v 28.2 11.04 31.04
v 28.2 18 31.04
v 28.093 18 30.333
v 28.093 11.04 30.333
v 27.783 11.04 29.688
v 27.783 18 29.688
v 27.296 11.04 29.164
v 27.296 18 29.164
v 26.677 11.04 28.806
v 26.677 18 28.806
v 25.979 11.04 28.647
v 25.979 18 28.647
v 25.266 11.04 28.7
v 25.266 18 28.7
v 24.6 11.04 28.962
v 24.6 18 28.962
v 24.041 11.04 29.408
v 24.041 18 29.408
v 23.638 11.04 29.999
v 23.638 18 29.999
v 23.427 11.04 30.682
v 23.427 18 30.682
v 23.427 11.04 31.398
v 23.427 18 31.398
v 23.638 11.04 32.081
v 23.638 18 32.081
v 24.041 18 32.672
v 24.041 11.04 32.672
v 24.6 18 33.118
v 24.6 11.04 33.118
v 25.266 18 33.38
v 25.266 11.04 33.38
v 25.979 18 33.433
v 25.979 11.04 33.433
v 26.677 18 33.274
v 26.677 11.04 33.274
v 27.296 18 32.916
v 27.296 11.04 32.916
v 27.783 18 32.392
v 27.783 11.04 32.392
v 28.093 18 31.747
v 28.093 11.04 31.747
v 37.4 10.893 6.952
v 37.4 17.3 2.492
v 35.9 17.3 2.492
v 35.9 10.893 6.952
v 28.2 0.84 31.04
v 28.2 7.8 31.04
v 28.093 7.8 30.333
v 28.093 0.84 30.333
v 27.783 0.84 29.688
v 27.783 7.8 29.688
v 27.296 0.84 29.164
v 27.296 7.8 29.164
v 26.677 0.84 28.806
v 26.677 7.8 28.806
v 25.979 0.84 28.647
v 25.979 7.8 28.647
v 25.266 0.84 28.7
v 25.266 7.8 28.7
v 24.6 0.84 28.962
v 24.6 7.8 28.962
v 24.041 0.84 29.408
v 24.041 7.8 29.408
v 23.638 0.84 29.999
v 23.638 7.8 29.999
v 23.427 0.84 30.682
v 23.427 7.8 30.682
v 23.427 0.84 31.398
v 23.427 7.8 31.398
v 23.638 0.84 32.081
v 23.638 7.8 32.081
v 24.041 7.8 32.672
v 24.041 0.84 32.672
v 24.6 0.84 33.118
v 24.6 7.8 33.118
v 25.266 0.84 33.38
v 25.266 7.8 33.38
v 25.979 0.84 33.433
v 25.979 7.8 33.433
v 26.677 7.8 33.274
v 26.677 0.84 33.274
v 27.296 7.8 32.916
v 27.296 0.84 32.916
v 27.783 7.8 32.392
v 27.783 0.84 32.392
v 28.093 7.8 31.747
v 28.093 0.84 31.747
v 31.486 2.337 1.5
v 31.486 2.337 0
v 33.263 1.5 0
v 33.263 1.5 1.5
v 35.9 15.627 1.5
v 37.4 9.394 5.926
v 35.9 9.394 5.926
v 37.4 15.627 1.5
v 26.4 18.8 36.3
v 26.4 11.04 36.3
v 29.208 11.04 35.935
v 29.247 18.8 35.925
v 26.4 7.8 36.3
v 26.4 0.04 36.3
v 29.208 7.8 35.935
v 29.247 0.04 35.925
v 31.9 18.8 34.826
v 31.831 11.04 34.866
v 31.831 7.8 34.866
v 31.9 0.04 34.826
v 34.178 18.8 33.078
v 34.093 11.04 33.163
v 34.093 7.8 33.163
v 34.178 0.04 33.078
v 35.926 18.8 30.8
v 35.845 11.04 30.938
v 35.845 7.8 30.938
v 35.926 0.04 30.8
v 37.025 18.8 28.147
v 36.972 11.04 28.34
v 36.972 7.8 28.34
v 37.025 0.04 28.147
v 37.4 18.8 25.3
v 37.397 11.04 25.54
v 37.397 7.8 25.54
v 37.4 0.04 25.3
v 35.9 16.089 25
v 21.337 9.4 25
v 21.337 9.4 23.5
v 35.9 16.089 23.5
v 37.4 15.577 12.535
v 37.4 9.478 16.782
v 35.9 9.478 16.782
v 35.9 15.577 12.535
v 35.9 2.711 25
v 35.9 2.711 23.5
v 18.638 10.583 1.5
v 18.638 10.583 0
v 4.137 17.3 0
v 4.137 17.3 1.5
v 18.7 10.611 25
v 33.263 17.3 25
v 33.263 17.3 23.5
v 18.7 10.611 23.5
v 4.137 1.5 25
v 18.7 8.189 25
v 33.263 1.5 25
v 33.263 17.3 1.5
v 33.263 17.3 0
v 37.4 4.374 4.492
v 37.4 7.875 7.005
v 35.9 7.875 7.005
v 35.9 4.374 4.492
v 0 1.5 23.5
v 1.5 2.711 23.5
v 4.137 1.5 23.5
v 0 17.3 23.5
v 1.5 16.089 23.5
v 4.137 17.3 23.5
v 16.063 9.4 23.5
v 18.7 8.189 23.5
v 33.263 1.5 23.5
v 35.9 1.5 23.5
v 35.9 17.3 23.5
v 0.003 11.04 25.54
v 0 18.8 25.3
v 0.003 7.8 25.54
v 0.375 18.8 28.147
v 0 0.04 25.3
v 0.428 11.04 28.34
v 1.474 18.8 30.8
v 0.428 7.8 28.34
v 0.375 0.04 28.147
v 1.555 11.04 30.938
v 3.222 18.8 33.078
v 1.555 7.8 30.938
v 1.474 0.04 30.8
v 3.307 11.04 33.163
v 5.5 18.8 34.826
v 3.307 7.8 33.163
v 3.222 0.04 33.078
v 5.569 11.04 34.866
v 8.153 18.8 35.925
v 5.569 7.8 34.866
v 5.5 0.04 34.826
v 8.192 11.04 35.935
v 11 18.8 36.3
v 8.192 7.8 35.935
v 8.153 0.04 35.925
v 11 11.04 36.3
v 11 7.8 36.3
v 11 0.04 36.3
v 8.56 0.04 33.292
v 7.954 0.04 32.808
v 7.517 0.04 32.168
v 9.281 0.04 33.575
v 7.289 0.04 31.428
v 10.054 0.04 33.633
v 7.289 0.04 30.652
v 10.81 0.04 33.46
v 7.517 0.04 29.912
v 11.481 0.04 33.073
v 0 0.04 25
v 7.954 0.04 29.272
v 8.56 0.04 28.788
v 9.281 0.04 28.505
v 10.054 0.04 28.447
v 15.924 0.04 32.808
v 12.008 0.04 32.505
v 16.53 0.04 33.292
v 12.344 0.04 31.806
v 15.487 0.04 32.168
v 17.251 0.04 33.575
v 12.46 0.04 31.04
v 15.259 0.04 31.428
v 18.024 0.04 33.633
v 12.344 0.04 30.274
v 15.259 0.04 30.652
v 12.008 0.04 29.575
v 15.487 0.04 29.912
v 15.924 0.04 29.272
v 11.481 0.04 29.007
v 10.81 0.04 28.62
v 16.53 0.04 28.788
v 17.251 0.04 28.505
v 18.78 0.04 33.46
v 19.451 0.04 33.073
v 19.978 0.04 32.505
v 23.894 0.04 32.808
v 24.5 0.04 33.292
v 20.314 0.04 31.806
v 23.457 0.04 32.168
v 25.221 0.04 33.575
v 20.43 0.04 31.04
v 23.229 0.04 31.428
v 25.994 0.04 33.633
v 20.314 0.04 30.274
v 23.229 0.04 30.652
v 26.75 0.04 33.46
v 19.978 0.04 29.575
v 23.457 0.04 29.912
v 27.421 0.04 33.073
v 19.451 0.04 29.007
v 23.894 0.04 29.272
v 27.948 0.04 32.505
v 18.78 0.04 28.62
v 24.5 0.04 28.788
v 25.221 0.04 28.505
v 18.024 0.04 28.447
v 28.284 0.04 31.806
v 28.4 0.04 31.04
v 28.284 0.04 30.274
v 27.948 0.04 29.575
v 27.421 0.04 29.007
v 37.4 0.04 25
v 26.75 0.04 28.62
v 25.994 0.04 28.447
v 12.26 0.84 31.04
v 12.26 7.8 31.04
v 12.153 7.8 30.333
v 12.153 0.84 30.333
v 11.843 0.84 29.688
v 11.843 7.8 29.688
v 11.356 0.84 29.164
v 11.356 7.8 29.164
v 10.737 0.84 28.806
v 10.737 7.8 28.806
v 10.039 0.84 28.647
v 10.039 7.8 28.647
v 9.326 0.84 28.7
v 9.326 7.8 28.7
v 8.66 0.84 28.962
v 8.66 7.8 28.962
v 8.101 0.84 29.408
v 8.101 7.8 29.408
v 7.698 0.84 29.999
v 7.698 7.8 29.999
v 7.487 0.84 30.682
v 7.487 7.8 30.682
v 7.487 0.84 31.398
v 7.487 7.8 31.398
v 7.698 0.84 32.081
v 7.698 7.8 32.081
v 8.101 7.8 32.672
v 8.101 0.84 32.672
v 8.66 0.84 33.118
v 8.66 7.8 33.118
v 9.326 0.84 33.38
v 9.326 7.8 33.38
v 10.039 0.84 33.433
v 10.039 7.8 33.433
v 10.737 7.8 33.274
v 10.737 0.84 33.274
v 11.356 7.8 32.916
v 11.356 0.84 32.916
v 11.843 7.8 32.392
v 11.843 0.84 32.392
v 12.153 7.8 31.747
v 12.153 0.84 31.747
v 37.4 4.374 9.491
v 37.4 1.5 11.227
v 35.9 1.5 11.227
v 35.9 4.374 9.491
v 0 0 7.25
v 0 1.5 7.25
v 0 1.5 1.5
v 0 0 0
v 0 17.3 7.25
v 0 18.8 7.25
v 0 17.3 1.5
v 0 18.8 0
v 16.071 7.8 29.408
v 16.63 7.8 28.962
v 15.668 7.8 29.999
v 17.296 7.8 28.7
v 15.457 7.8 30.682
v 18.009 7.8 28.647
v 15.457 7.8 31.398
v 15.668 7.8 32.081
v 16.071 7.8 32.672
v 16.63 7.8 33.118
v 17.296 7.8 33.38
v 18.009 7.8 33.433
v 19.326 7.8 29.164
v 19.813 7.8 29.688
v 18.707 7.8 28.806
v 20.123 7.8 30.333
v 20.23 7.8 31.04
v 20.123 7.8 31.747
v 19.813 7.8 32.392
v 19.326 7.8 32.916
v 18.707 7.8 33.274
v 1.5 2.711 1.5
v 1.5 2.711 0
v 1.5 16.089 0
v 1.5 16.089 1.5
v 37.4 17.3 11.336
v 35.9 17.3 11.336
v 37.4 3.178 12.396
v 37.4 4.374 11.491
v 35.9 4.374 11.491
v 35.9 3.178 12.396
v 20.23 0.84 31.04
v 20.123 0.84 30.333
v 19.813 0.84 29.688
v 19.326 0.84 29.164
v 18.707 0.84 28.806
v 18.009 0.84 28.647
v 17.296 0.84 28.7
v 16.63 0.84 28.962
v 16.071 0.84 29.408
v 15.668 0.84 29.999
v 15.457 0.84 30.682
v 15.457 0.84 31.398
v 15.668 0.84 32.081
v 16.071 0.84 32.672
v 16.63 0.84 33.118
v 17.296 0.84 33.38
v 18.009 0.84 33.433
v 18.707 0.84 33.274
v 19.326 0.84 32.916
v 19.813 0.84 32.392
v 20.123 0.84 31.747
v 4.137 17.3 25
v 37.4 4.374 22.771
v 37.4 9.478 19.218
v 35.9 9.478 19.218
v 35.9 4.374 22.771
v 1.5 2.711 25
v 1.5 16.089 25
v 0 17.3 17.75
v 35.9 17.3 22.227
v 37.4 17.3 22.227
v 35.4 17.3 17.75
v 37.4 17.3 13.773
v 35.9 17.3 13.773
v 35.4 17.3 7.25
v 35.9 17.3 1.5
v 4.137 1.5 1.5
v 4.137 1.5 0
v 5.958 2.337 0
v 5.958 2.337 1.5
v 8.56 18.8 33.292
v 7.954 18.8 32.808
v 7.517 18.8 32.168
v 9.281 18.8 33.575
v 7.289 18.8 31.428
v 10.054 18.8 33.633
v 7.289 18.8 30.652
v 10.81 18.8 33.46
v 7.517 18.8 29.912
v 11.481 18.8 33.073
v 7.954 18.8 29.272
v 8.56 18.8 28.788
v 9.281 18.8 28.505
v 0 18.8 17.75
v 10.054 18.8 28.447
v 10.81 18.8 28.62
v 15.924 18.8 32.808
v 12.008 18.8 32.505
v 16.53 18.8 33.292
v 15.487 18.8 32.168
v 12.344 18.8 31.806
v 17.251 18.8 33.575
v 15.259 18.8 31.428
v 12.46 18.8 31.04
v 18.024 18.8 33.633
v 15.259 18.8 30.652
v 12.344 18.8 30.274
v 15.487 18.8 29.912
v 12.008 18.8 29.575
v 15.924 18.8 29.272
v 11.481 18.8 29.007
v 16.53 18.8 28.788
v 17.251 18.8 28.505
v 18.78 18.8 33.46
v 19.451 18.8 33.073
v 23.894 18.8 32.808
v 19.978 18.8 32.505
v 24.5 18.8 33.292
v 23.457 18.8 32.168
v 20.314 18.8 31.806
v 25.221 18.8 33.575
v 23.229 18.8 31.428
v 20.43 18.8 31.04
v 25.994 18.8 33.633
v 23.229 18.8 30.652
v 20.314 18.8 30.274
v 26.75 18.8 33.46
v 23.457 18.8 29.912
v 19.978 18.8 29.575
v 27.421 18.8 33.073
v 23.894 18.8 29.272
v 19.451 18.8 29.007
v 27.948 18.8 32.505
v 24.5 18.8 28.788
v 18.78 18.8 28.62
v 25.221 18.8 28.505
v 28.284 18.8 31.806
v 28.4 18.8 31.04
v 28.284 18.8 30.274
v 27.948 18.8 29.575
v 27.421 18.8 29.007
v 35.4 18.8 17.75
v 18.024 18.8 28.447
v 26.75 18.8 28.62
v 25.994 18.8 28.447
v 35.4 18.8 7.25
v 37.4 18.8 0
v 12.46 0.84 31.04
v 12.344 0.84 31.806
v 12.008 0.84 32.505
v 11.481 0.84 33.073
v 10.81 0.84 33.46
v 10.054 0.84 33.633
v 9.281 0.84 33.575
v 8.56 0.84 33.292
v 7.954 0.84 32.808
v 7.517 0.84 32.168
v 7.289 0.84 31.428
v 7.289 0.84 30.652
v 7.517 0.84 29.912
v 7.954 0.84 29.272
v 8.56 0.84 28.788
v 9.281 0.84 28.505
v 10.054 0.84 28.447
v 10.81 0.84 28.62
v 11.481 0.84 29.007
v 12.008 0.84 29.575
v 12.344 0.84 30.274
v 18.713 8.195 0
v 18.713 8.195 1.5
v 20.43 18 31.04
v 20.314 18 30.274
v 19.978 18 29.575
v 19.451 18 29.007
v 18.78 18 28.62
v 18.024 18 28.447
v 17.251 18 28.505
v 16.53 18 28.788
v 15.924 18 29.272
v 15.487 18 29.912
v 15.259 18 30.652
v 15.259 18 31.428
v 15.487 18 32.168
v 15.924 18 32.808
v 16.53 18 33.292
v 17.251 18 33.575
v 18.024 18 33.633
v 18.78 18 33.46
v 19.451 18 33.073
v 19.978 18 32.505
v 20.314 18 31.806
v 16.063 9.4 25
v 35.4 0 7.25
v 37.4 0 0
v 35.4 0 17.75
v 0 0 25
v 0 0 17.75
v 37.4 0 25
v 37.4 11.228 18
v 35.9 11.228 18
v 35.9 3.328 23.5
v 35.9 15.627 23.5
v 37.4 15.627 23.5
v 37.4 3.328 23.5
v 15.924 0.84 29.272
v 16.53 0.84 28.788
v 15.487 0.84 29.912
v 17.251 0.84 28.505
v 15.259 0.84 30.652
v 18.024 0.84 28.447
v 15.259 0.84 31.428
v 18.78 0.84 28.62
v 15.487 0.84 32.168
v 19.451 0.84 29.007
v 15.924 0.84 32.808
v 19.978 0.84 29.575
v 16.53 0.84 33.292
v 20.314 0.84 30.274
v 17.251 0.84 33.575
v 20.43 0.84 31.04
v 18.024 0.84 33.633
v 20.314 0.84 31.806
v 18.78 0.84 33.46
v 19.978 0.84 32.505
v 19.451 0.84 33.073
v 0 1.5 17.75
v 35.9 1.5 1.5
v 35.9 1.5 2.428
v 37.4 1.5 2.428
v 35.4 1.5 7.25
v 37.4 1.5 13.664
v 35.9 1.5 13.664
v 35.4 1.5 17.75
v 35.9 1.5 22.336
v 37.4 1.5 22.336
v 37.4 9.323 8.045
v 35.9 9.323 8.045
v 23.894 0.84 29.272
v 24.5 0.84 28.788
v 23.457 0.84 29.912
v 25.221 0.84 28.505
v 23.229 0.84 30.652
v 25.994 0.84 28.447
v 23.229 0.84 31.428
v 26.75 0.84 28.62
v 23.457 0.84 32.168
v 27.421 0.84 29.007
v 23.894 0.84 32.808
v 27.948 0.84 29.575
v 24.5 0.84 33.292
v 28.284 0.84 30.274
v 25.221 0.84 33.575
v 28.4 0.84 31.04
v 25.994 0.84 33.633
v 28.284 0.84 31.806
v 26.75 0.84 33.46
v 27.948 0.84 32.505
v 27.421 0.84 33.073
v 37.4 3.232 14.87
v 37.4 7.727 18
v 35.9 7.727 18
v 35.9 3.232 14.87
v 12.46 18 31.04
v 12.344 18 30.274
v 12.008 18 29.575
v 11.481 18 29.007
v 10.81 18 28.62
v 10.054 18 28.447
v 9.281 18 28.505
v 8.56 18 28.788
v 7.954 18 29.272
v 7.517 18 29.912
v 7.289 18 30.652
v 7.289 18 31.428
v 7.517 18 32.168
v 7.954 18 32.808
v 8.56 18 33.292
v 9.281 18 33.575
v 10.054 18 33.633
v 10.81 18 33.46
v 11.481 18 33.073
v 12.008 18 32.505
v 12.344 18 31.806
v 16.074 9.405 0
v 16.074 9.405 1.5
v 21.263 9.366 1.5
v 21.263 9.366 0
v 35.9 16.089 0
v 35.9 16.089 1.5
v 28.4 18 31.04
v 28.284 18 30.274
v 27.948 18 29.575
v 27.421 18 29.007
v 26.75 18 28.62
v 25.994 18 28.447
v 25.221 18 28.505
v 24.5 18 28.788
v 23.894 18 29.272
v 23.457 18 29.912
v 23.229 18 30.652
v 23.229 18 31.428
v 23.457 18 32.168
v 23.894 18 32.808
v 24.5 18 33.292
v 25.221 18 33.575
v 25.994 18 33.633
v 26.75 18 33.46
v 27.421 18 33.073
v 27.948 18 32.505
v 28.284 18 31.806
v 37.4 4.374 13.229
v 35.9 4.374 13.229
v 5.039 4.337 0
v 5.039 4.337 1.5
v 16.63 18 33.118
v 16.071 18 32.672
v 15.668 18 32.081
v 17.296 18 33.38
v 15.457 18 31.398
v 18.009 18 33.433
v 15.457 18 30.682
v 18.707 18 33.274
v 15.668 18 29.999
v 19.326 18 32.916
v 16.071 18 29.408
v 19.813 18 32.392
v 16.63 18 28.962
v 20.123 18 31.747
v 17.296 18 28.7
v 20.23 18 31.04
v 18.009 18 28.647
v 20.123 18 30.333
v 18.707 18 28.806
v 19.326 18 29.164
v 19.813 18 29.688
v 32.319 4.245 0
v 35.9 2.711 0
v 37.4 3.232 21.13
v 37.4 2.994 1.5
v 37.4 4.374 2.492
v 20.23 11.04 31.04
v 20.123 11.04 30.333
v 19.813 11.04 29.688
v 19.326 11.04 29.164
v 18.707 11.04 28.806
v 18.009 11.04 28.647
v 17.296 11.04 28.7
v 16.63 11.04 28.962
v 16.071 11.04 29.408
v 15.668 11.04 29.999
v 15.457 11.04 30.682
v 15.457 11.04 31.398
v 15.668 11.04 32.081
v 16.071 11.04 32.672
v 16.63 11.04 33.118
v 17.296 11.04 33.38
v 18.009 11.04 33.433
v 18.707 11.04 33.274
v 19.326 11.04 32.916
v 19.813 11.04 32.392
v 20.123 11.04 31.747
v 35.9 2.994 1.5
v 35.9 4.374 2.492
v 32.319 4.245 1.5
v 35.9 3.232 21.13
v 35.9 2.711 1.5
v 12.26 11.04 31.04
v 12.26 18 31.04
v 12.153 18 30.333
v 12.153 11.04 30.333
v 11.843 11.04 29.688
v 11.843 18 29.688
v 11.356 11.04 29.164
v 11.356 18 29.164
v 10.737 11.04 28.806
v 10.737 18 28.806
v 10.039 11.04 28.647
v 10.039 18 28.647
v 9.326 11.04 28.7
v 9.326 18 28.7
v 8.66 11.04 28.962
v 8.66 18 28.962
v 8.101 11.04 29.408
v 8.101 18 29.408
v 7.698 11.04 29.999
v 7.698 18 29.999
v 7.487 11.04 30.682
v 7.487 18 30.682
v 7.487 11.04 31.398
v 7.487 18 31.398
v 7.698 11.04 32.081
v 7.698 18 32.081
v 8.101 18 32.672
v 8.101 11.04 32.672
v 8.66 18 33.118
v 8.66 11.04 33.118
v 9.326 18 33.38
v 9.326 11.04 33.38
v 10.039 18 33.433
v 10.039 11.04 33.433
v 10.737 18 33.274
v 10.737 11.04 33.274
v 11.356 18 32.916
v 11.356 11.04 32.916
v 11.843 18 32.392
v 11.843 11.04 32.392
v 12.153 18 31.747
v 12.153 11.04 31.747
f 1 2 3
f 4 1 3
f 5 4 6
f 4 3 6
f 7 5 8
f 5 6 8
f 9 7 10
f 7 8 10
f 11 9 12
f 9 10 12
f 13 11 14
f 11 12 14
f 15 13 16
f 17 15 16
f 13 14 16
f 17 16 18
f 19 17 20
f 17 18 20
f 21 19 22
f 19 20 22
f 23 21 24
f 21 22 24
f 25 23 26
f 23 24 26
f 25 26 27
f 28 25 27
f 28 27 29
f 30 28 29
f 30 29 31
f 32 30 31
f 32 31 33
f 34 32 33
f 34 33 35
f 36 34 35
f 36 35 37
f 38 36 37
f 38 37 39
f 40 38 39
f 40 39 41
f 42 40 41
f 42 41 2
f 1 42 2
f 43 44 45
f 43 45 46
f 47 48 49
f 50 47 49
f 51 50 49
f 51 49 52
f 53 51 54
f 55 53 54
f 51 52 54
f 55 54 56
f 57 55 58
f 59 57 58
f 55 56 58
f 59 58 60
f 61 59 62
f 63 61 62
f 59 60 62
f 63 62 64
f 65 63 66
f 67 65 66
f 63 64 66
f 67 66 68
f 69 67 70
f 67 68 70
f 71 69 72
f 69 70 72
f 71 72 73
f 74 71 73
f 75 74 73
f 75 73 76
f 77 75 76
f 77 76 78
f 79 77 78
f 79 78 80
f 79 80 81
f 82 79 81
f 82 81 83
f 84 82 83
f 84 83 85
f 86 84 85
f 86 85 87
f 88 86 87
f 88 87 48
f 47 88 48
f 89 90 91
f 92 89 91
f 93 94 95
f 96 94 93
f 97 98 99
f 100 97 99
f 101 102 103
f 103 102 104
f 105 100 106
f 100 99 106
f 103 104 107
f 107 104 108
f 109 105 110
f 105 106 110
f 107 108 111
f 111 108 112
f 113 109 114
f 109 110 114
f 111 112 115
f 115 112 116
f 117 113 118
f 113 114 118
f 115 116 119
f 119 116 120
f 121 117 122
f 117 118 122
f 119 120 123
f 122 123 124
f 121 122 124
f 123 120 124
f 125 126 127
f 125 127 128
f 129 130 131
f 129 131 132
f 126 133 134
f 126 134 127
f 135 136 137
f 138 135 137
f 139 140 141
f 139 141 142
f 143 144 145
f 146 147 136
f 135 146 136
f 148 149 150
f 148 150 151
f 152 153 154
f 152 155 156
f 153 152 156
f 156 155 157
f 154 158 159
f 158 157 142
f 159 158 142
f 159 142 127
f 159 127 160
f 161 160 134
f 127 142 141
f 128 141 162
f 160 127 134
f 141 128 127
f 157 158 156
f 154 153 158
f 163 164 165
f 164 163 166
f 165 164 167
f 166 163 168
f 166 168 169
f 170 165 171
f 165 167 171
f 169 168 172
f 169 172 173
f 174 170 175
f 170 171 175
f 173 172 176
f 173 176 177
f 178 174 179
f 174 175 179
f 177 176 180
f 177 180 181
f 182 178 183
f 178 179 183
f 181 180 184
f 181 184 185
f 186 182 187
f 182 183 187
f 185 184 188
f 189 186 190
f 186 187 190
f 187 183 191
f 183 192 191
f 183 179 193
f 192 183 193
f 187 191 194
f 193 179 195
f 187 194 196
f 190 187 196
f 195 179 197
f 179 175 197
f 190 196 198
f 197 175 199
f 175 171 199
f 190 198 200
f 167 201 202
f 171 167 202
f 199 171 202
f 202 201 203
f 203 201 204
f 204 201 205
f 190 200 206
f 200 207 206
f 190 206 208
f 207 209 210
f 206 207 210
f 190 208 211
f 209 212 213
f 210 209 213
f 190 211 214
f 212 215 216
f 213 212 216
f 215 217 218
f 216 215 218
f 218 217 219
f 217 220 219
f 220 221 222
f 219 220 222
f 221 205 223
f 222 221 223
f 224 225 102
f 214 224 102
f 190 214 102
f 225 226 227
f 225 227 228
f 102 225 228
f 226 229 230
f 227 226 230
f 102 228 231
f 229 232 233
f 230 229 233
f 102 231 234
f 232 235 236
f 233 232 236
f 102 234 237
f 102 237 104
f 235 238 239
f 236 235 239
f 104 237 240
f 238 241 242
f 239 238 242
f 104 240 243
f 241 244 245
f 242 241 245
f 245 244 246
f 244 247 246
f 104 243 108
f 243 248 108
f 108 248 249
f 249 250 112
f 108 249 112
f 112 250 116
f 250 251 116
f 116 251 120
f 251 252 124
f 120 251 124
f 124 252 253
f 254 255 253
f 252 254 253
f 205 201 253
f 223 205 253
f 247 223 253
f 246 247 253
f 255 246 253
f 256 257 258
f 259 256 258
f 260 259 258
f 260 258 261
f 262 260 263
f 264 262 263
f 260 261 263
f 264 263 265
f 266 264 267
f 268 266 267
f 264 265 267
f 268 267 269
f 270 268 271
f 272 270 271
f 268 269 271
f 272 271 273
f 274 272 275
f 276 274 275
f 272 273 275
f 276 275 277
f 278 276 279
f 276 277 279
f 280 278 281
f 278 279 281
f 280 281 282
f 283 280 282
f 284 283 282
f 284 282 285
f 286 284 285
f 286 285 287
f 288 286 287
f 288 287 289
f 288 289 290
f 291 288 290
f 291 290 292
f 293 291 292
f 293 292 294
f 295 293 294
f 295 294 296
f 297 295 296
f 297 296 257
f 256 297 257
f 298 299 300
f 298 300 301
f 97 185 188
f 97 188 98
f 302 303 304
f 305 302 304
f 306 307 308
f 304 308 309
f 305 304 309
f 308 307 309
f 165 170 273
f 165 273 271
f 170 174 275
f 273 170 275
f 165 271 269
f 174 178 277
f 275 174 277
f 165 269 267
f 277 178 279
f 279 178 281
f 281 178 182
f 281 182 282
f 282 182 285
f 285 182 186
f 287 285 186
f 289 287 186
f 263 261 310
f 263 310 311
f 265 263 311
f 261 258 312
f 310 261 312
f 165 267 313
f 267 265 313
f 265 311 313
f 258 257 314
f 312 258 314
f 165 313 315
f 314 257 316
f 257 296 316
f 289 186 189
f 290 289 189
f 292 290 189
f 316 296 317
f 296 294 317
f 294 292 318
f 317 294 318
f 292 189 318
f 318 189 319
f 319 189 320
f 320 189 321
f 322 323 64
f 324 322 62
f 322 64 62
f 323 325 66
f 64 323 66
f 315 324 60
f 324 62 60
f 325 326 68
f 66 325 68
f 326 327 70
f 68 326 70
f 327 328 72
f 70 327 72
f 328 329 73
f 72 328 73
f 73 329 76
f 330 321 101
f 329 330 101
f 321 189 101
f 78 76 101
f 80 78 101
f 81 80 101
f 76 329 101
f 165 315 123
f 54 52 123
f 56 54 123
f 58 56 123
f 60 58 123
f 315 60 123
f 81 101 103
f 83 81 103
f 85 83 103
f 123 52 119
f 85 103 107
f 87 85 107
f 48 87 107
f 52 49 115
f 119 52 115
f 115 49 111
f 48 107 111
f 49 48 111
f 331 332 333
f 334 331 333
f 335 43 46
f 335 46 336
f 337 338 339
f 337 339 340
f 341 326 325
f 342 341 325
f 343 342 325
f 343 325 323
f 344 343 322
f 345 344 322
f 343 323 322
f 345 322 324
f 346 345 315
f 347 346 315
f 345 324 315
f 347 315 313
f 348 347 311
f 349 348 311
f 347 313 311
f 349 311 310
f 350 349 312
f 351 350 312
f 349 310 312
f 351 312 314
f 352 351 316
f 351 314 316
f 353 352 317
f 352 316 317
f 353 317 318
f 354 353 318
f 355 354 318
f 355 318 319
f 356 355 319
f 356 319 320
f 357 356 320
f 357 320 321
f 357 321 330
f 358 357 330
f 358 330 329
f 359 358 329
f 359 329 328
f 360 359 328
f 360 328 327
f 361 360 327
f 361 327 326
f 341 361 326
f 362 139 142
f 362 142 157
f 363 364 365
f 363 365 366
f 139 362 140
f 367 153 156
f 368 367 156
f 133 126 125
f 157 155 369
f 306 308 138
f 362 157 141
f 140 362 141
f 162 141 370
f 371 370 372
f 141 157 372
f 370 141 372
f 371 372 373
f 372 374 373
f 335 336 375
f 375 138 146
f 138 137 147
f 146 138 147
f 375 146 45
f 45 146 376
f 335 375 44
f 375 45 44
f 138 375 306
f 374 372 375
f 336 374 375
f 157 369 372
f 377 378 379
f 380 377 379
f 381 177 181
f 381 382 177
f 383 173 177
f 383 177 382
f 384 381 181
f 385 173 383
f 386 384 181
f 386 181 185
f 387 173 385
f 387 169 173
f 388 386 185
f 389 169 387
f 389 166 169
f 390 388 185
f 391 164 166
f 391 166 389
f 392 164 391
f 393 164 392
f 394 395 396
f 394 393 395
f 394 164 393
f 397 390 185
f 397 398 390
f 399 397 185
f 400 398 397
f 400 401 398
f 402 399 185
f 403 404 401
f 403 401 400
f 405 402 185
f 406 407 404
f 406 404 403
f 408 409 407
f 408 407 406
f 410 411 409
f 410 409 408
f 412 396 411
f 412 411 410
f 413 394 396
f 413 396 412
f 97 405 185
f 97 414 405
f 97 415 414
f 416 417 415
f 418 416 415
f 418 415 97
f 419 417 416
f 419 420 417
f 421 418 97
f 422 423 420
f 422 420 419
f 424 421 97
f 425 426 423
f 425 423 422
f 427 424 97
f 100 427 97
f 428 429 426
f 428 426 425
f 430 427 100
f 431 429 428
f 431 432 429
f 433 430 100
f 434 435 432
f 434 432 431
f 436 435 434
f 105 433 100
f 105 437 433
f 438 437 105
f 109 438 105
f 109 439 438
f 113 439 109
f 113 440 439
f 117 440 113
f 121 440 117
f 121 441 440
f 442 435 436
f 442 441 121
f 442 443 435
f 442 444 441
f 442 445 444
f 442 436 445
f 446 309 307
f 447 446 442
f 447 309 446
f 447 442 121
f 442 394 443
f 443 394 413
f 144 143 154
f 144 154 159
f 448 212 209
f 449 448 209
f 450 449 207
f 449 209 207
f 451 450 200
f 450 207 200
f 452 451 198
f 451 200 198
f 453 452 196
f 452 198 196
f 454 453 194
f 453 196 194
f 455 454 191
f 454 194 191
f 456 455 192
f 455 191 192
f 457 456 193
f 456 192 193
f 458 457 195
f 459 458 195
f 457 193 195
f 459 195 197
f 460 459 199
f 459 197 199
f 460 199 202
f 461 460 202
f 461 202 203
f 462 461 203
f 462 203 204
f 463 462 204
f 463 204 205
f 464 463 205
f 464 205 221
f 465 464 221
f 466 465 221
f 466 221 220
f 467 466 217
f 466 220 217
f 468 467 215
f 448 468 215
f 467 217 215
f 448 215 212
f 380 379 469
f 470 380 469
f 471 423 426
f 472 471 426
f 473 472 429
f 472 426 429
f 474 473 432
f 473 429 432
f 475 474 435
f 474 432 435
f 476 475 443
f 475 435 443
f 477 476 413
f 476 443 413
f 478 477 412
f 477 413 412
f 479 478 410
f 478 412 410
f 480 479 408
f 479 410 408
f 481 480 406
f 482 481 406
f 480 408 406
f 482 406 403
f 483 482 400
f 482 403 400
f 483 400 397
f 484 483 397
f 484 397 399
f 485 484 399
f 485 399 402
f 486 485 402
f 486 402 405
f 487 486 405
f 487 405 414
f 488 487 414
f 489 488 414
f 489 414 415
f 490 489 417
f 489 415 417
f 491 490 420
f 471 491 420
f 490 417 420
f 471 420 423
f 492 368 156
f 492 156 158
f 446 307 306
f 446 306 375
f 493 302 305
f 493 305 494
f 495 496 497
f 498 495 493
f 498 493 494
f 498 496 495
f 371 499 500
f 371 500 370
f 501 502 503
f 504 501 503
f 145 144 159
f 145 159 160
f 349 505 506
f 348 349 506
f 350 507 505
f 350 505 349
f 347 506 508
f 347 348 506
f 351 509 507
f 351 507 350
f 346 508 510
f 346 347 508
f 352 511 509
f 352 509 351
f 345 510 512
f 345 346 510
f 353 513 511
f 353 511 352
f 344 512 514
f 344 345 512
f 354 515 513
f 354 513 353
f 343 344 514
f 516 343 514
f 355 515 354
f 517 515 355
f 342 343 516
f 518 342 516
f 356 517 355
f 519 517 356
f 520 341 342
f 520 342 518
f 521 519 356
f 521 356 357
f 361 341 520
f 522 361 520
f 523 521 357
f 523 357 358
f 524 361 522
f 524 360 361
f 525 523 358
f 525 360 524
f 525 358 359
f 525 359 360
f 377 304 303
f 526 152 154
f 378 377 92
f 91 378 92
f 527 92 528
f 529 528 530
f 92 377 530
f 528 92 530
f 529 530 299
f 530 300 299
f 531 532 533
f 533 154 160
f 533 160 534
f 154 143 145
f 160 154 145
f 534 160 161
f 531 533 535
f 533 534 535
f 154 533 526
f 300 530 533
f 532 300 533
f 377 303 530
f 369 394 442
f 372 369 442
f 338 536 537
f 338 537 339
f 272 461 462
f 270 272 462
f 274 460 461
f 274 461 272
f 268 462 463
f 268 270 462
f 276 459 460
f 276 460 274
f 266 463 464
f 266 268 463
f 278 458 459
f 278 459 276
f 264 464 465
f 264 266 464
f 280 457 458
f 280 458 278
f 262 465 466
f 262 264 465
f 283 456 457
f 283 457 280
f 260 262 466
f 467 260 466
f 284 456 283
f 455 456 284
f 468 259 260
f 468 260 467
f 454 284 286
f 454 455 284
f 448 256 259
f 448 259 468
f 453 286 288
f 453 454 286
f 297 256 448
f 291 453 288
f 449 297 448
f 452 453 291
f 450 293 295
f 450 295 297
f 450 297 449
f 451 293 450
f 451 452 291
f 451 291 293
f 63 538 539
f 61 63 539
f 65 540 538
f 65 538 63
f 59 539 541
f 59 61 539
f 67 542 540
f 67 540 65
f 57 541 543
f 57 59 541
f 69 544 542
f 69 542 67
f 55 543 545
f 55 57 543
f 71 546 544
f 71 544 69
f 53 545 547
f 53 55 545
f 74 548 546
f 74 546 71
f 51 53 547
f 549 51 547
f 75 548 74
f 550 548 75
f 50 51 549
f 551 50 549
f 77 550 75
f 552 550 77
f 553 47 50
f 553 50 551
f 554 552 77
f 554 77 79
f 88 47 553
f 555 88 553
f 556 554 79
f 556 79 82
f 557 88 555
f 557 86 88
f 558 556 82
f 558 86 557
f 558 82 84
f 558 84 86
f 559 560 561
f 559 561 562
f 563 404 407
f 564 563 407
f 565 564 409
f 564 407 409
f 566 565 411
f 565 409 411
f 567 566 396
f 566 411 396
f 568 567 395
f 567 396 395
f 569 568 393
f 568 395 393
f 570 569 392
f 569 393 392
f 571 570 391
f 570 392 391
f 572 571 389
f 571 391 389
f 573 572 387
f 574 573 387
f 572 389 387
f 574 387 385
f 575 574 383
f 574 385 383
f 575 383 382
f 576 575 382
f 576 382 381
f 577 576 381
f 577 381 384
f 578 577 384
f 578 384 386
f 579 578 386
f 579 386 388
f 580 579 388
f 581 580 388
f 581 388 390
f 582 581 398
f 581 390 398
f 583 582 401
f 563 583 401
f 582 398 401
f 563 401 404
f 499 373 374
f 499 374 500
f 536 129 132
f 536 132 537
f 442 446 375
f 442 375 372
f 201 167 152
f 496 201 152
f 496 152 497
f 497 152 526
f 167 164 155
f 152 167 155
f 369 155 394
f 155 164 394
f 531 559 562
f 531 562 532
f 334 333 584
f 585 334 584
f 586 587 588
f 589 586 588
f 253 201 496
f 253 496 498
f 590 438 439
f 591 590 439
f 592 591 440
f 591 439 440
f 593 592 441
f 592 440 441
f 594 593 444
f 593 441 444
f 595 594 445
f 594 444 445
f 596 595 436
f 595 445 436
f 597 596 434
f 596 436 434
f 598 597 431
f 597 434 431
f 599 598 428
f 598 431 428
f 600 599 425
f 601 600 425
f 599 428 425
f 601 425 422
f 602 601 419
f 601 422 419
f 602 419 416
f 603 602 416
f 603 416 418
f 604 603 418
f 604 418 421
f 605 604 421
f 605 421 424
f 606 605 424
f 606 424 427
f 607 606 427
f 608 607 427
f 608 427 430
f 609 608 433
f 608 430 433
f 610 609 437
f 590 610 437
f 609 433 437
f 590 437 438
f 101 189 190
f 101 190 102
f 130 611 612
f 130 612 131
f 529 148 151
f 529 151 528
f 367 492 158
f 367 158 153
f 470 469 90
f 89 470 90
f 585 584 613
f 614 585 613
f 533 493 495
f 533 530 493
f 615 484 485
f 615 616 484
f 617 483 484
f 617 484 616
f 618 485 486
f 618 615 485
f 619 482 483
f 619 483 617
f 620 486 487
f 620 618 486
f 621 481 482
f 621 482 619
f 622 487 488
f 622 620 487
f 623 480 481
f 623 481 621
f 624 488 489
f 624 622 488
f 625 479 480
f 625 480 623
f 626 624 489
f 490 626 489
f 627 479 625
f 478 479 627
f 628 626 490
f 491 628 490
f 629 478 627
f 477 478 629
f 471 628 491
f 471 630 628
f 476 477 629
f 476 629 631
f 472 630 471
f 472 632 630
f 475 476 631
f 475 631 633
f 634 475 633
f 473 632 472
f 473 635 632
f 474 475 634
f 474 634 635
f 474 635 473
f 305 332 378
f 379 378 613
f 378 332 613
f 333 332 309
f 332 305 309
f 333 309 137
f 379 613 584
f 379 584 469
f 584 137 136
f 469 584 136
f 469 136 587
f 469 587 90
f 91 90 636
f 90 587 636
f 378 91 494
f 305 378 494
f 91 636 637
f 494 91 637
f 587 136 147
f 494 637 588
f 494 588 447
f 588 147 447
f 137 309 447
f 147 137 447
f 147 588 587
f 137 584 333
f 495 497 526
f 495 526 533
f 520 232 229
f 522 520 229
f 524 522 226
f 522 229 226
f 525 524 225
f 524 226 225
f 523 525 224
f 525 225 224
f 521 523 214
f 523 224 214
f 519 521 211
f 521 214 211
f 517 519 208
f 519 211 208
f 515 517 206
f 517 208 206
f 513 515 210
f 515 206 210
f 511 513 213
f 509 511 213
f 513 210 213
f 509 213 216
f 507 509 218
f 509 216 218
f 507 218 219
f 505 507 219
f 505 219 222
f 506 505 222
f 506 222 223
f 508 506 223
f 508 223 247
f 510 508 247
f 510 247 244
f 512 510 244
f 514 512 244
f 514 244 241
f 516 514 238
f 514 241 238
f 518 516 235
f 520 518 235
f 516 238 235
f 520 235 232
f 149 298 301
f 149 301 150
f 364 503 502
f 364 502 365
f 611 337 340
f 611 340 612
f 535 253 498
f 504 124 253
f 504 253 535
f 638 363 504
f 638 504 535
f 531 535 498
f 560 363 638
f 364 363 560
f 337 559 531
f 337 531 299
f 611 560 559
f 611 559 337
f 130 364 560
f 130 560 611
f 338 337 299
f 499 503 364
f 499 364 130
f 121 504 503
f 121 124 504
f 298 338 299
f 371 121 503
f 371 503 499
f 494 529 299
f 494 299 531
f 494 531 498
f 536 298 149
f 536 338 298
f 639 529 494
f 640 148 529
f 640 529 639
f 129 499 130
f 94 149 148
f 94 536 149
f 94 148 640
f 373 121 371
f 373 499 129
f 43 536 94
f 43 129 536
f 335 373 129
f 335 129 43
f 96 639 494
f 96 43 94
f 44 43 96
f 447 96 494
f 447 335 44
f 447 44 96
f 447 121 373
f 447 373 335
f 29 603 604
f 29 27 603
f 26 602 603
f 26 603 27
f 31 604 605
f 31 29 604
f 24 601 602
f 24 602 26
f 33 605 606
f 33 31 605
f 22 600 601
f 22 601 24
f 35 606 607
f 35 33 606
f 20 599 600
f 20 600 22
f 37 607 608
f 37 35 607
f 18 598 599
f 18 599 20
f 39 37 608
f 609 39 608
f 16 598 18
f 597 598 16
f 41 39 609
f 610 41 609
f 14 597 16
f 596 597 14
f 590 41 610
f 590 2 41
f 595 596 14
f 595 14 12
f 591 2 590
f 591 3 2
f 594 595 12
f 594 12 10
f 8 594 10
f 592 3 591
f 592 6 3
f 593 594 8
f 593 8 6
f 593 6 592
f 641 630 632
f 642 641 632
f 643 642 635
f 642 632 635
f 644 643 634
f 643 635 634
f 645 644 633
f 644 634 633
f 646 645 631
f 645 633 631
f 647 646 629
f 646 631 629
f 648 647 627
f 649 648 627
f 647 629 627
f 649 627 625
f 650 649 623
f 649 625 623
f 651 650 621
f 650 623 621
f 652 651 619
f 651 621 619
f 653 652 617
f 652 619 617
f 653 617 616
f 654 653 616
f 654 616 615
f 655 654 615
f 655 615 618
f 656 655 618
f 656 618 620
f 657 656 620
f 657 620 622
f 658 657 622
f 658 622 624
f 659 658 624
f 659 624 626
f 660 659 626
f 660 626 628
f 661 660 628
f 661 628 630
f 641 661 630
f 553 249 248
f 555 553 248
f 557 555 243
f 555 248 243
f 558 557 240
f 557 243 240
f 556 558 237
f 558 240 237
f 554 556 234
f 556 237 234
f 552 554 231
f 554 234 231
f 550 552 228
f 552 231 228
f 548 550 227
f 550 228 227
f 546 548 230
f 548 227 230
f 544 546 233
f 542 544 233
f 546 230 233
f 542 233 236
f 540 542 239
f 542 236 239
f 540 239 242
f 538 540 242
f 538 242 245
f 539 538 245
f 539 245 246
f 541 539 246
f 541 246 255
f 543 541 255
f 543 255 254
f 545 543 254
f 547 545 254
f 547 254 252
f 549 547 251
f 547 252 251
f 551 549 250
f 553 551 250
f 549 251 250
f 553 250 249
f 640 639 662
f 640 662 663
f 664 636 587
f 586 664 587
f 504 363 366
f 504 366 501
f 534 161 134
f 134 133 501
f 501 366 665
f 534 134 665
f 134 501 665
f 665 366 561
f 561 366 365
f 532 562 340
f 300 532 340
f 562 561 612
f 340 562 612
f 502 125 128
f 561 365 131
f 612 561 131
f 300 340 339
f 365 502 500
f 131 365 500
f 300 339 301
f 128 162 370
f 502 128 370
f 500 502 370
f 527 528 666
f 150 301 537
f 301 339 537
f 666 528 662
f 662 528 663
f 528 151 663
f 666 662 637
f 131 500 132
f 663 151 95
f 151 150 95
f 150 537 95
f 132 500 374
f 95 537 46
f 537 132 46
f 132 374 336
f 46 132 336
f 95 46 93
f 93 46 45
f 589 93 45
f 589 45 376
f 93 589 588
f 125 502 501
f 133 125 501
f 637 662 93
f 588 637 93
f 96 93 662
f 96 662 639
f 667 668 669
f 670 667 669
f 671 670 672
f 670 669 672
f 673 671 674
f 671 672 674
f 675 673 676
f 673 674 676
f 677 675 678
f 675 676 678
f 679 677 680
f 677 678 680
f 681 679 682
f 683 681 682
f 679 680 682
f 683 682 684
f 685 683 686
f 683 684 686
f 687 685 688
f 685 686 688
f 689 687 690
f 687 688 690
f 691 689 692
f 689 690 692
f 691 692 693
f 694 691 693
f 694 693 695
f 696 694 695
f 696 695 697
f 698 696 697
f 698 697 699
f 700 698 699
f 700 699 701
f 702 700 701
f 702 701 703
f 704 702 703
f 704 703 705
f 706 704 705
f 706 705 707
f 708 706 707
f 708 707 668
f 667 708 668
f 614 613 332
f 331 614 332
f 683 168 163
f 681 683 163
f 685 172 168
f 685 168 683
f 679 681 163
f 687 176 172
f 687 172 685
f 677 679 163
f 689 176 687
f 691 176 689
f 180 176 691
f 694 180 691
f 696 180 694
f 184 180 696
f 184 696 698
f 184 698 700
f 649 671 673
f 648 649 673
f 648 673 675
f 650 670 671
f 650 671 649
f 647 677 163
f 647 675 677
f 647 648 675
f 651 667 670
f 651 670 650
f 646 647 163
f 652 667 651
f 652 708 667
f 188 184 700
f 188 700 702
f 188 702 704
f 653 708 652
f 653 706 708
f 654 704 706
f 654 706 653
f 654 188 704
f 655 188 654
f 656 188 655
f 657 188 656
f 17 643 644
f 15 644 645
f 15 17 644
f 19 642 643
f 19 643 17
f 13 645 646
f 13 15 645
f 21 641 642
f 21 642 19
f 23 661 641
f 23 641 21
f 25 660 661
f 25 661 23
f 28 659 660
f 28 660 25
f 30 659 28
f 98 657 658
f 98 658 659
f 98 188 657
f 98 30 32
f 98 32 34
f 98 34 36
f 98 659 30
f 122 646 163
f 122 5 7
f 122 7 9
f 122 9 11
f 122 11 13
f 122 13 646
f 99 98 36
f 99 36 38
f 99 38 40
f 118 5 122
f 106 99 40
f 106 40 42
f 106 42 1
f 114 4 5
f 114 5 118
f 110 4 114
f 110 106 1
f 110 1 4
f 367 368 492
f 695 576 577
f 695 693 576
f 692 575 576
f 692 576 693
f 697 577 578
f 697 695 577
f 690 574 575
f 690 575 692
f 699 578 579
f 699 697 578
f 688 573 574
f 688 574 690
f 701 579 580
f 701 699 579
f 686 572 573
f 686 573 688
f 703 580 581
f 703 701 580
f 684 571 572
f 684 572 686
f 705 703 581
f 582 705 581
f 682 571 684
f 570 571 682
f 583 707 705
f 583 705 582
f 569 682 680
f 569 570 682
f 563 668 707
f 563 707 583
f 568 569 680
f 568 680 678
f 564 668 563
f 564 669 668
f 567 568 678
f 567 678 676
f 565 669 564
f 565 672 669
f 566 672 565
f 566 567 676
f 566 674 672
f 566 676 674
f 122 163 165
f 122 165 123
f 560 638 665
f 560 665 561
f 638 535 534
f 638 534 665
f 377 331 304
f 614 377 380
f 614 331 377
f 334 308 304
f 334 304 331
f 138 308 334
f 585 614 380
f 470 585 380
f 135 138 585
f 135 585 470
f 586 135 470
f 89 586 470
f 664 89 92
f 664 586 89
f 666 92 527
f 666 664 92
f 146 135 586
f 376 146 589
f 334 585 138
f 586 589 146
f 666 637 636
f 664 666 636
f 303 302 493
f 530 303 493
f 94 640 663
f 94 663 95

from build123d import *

# Parameters (mm, degrees)
SKETCH1_W            = 37.4
SKETCH1_H            = 18.8
BOSS_EXTRUDE1_DEPTH  = 2
SKETCH2_W            = 33.4
SKETCH2_H            = 15.8
BOSS_EXTRUDE2_DEPTH  = 23
SKETCH4_W            = 22
SKETCH4_H            = 15.8
CUT_EXTRUDE3_DEPTH   = 5550
SKETCH6_W            = 34.4
SKETCH6_H            = 15.8
CUT_EXTRUDE4_DEPTH   = 5550
CUT_EXTRUDE5_DEPTH   = 5550
BOSS_EXTRUDE3_DEPTH  = 1.5
BOSS_EXTRUDE4_DEPTH  = 1.5
BOSS_EXTRUDE5_DEPTH  = 1.5
SKETCH11_W           = 35.4
SKETCH11_H           = 5.25
BOSS_EXTRUDE6_DEPTH  = 1.5
SKETCH12_W           = 35.4
SKETCH12_H           = 7.25
BOSS_EXTRUDE7_DEPTH  = 1.5
SKETCH13_W           = 35.4
SKETCH13_H           = 5.25
BOSS_EXTRUDE8_DEPTH  = 1.5
SKETCH14_W           = 35.4
SKETCH14_H           = 5.25
BOSS_EXTRUDE9_DEPTH  = 1.5
SKETCH15_W           = 37.4
SKETCH15_H           = 2.35
BOSS_EXTRUDE10_DEPTH = 1.5
SKETCH16_W           = 37.4
SKETCH16_H           = 2.35
CUT_EXTRUDE6_DEPTH   = 10
SKETCH17_W           = 37.4
SKETCH17_H           = 11.3
SKETCH17_R           = 2.4
BOSS_EXTRUDE11_DEPTH = 18.76
FILLET2_R            = 11
FILLET3_R            = 11
SKETCH21_W           = 41.68561835
SKETCH21_H           = 3.24
CUT_EXTRUDE7_DEPTH   = 10.76
SKETCH22_R           = 2.6
CUT_EXTRUDE8_DEPTH   = 0.8
SKETCH23_R           = 2.6
CUT_EXTRUDE9_DEPTH   = 0.8


with BuildPart() as part:
    # Sketch1 → Boss-Extrude1 (new body)
    with BuildSketch(Plane.XY):
        with Locations((18.7, 9.4)):
            Rectangle(SKETCH1_W, SKETCH1_H)
    extrude(amount=BOSS_EXTRUDE1_DEPTH)

    # Sketch2 → Boss-Extrude2 (add)
    with BuildSketch(Plane.XY.offset(2)):
        Polygon((0, 18.8), (37.4, 18.8), (37.4, 17.3), (37.4, 0), (0, 0), (0, 16.8), align=None)
        with Locations((18.7, 9.4)):
            Rectangle(SKETCH2_W, SKETCH2_H, mode=Mode.SUBTRACT)
    extrude(amount=BOSS_EXTRUDE2_DEPTH)

    # Sketch4 → Cut-Extrude3 (cut)
    with BuildSketch(Plane.ZY):
        with Locations((12.5, 9.4)):
            Rectangle(SKETCH4_W, SKETCH4_H)
    extrude(amount=-CUT_EXTRUDE3_DEPTH, mode=Mode.SUBTRACT)

    # Sketch6 → Cut-Extrude4 (cut)
    with BuildSketch(Plane(origin=(0, 0, 0), x_dir=(-1, 0, 0), z_dir=(0, 0, -1))):
        with Locations((-18.7, 9.4)):
            Rectangle(SKETCH6_W, SKETCH6_H)
    extrude(amount=-CUT_EXTRUDE4_DEPTH, mode=Mode.SUBTRACT)

    # Sketch7 → Cut-Extrude5 (cut)
    with BuildSketch(Plane(origin=(0, 18.8, 0), x_dir=(1, 0, 0), z_dir=(0, 1, 0))):
        Polygon((1.635040334, -2), (35.4, -2), (35.4, -23), (1.635040334, -23), (0, -23), (0, -2), align=None)
    extrude(amount=-CUT_EXTRUDE5_DEPTH, mode=Mode.SUBTRACT)

    # Sketch8 → Boss-Extrude3 (add)
    with BuildSketch(Plane(origin=(0, 0, 0), x_dir=(-1, 0, 0), z_dir=(0, 0, -1))):
        Polygon((-35.9, 16.089041374), (-35.9, 17.3), (-33.263482485, 17.3), (-18.638089895, 10.582523171), (-4.136517515, 17.3), (-1.5, 17.3), (-1.5, 16.089041374), (-16.074159281, 9.404903878), (-5.039195107, 4.33651917), (-1.5, 2.710958626), (-1.5, 1.5), (-4.136517515, 1.5), (-5.957799758, 2.33651917), (-18.712609683, 8.194833031), (-31.486134971, 2.33651917), (-33.263482485, 1.5), (-35.9, 1.5), (-35.9, 2.710958626), (-32.318884833, 4.245250178), (-21.26339944, 9.366416698), align=None)
    extrude(amount=-BOSS_EXTRUDE3_DEPTH)

    # Sketch9 → Boss-Extrude4 (add)
    with BuildSketch(Plane.XY.offset(25)):
        Polygon((21.336517515, 9.4), (35.9, 16.089041374), (35.9, 17.3), (33.263482485, 17.3), (18.7, 10.610958626), (4.136517515, 17.3), (1.5, 17.3), (1.5, 16.089041374), (16.063482485, 9.4), (1.5, 2.710958626), (1.5, 1.5), (4.136517515, 1.5), (18.7, 8.189041374), (33.263482485, 1.5), (35.9, 1.5), (35.9, 2.710958626), align=None)
    extrude(amount=-BOSS_EXTRUDE4_DEPTH)

    # Sketch10 → Boss-Extrude5 (add)
    with BuildSketch(Plane(origin=(37.4, 0, 0), x_dir=(0, 0, -1), z_dir=(1, 0, 0))):
        Polygon((-23.5, 17.3), (-23.5, 15.627431355), (-19.218481828, 9.477614344), (-22.771372102, 4.374371951), (-23.5, 3.327797334), (-23.5, 1.5), (-22.335553475, 1.5), (-21.129985293, 3.231634299), (-18, 7.727431355), (-14.870014707, 3.231634299), (-13.664446525, 1.5), (-12.445964697, 1.5), (-11.227482869, 1.5), (-9.490525788, 4.374371951), (-7.004939959, 7.874823075), (-4.491504582, 4.374371951), (-2.427613988, 1.5), (-1.5, 1.5), (-1.5, 2.993507593), (-2.491504582, 4.374371951), (-5.926135142, 9.394104162), (-1.5, 15.627431355), (-1.5, 17.3), (-2.491504582, 17.3), (-6.951935611, 10.893317416), (-11.335553475, 17.3), (-13.772517131, 17.3), (-18, 11.227797334), (-22.227482869, 17.3), align=None)
        Polygon((-11.490525788, 4.374371951), (-12.395540567, 3.177755602), (-13.228627898, 4.374371951), (-16.781518172, 9.477614344), (-12.535227515, 15.576831834), (-8.044999313, 9.323309465), align=None, mode=Mode.SUBTRACT)
    extrude(amount=-BOSS_EXTRUDE5_DEPTH)

    # Sketch11 → Boss-Extrude6 (add)
    with BuildSketch(Plane(origin=(0, 18.8, 0), x_dir=(1, 0, 0), z_dir=(0, 1, 0))):
        with Locations((17.7, -4.625)):
            Rectangle(SKETCH11_W, SKETCH11_H)
    extrude(amount=-BOSS_EXTRUDE6_DEPTH)

    # Sketch12 → Boss-Extrude7 (add)
    with BuildSketch(Plane(origin=(0, 18.8, 0), x_dir=(1, 0, 0), z_dir=(0, 1, 0))):
        with Locations((17.7, -21.375)):
            Rectangle(SKETCH12_W, SKETCH12_H)
    extrude(amount=-BOSS_EXTRUDE7_DEPTH)

    # Sketch13 → Boss-Extrude8 (add)
    with BuildSketch(Plane.XZ):
        with Locations((17.7, 20.375)):
            Rectangle(SKETCH13_W, SKETCH13_H)
    extrude(amount=-BOSS_EXTRUDE8_DEPTH)

    # Sketch14 → Boss-Extrude9 (add)
    with BuildSketch(Plane.XZ):
        with Locations((17.7, 4.625)):
            Rectangle(SKETCH14_W, SKETCH14_H)
    extrude(amount=-BOSS_EXTRUDE9_DEPTH)

    # Sketch15 → Boss-Extrude10 (add)
    with BuildSketch(Plane(origin=(0, 18.8, 0), x_dir=(1, 0, 0), z_dir=(0, 1, 0))):
        with Locations((18.7, 1.175)):
            Rectangle(SKETCH15_W, SKETCH15_H)
    extrude(amount=-BOSS_EXTRUDE10_DEPTH)

    # Sketch16 → Cut-Extrude6 (cut)
    with BuildSketch(Plane(origin=(0, 18.8, 0), x_dir=(1, 0, 0), z_dir=(0, 1, 0))):
        with Locations((18.7, 1.175)):
            Rectangle(SKETCH16_W, SKETCH16_H)
    extrude(amount=-CUT_EXTRUDE6_DEPTH, mode=Mode.SUBTRACT)

    # Sketch17 → Boss-Extrude11 (add)
    with BuildSketch(Plane(origin=(0, 18.8, 0), x_dir=(1, 0, 0), z_dir=(0, 1, 0))):
        with Locations((18.7, -30.65)):
            Rectangle(SKETCH17_W, SKETCH17_H)
        with Locations((25.8, -31.04)):
            Circle(SKETCH17_R, mode=Mode.SUBTRACT)
        with Locations((17.83, -31.04)):
            Circle(SKETCH17_R, mode=Mode.SUBTRACT)
        with Locations((9.86, -31.04)):
            Circle(SKETCH17_R, mode=Mode.SUBTRACT)
    extrude(amount=-BOSS_EXTRUDE11_DEPTH)

    # Fillet2
    fillet2_edges = [part.edges().sort_by_distance(p)[0] for p in [
        (0, 9.42, 36.3),
    ]]
    fillet(fillet2_edges, radius=FILLET2_R)

    # Fillet3
    fillet3_edges = [part.edges().sort_by_distance(p)[0] for p in [
        (37.4, 9.42, 36.3),
    ]]
    fillet(fillet3_edges, radius=FILLET3_R)

    # Sketch21 → Cut-Extrude7 (cut)
    with BuildSketch(Plane.XY.offset(36.3)):
        with Locations((18.29957708, 9.42)):
            Rectangle(SKETCH21_W, SKETCH21_H)
    extrude(amount=-CUT_EXTRUDE7_DEPTH, mode=Mode.SUBTRACT)

    # Sketch22 → Cut-Extrude8 (cut)
    with BuildSketch(Plane.XZ.offset(-0.04)):
        with Locations((9.86, 31.04)):
            Circle(SKETCH22_R)
        with Locations((17.83, 31.04)):
            Circle(SKETCH22_R)
        with Locations((25.8, 31.04)):
            Circle(SKETCH22_R)
    extrude(amount=-CUT_EXTRUDE8_DEPTH, mode=Mode.SUBTRACT)

    # Sketch23 → Cut-Extrude9 (cut)
    with BuildSketch(Plane(origin=(0, 18.8, 0), x_dir=(1, 0, 0), z_dir=(0, 1, 0))):
        with Locations((9.86, -31.04)):
            Circle(SKETCH23_R)
        with Locations((17.83, -31.04)):
            Circle(SKETCH23_R)
        with Locations((25.8, -31.04)):
            Circle(SKETCH23_R)
    extrude(amount=-CUT_EXTRUDE9_DEPTH, mode=Mode.SUBTRACT)


solid = part.part
